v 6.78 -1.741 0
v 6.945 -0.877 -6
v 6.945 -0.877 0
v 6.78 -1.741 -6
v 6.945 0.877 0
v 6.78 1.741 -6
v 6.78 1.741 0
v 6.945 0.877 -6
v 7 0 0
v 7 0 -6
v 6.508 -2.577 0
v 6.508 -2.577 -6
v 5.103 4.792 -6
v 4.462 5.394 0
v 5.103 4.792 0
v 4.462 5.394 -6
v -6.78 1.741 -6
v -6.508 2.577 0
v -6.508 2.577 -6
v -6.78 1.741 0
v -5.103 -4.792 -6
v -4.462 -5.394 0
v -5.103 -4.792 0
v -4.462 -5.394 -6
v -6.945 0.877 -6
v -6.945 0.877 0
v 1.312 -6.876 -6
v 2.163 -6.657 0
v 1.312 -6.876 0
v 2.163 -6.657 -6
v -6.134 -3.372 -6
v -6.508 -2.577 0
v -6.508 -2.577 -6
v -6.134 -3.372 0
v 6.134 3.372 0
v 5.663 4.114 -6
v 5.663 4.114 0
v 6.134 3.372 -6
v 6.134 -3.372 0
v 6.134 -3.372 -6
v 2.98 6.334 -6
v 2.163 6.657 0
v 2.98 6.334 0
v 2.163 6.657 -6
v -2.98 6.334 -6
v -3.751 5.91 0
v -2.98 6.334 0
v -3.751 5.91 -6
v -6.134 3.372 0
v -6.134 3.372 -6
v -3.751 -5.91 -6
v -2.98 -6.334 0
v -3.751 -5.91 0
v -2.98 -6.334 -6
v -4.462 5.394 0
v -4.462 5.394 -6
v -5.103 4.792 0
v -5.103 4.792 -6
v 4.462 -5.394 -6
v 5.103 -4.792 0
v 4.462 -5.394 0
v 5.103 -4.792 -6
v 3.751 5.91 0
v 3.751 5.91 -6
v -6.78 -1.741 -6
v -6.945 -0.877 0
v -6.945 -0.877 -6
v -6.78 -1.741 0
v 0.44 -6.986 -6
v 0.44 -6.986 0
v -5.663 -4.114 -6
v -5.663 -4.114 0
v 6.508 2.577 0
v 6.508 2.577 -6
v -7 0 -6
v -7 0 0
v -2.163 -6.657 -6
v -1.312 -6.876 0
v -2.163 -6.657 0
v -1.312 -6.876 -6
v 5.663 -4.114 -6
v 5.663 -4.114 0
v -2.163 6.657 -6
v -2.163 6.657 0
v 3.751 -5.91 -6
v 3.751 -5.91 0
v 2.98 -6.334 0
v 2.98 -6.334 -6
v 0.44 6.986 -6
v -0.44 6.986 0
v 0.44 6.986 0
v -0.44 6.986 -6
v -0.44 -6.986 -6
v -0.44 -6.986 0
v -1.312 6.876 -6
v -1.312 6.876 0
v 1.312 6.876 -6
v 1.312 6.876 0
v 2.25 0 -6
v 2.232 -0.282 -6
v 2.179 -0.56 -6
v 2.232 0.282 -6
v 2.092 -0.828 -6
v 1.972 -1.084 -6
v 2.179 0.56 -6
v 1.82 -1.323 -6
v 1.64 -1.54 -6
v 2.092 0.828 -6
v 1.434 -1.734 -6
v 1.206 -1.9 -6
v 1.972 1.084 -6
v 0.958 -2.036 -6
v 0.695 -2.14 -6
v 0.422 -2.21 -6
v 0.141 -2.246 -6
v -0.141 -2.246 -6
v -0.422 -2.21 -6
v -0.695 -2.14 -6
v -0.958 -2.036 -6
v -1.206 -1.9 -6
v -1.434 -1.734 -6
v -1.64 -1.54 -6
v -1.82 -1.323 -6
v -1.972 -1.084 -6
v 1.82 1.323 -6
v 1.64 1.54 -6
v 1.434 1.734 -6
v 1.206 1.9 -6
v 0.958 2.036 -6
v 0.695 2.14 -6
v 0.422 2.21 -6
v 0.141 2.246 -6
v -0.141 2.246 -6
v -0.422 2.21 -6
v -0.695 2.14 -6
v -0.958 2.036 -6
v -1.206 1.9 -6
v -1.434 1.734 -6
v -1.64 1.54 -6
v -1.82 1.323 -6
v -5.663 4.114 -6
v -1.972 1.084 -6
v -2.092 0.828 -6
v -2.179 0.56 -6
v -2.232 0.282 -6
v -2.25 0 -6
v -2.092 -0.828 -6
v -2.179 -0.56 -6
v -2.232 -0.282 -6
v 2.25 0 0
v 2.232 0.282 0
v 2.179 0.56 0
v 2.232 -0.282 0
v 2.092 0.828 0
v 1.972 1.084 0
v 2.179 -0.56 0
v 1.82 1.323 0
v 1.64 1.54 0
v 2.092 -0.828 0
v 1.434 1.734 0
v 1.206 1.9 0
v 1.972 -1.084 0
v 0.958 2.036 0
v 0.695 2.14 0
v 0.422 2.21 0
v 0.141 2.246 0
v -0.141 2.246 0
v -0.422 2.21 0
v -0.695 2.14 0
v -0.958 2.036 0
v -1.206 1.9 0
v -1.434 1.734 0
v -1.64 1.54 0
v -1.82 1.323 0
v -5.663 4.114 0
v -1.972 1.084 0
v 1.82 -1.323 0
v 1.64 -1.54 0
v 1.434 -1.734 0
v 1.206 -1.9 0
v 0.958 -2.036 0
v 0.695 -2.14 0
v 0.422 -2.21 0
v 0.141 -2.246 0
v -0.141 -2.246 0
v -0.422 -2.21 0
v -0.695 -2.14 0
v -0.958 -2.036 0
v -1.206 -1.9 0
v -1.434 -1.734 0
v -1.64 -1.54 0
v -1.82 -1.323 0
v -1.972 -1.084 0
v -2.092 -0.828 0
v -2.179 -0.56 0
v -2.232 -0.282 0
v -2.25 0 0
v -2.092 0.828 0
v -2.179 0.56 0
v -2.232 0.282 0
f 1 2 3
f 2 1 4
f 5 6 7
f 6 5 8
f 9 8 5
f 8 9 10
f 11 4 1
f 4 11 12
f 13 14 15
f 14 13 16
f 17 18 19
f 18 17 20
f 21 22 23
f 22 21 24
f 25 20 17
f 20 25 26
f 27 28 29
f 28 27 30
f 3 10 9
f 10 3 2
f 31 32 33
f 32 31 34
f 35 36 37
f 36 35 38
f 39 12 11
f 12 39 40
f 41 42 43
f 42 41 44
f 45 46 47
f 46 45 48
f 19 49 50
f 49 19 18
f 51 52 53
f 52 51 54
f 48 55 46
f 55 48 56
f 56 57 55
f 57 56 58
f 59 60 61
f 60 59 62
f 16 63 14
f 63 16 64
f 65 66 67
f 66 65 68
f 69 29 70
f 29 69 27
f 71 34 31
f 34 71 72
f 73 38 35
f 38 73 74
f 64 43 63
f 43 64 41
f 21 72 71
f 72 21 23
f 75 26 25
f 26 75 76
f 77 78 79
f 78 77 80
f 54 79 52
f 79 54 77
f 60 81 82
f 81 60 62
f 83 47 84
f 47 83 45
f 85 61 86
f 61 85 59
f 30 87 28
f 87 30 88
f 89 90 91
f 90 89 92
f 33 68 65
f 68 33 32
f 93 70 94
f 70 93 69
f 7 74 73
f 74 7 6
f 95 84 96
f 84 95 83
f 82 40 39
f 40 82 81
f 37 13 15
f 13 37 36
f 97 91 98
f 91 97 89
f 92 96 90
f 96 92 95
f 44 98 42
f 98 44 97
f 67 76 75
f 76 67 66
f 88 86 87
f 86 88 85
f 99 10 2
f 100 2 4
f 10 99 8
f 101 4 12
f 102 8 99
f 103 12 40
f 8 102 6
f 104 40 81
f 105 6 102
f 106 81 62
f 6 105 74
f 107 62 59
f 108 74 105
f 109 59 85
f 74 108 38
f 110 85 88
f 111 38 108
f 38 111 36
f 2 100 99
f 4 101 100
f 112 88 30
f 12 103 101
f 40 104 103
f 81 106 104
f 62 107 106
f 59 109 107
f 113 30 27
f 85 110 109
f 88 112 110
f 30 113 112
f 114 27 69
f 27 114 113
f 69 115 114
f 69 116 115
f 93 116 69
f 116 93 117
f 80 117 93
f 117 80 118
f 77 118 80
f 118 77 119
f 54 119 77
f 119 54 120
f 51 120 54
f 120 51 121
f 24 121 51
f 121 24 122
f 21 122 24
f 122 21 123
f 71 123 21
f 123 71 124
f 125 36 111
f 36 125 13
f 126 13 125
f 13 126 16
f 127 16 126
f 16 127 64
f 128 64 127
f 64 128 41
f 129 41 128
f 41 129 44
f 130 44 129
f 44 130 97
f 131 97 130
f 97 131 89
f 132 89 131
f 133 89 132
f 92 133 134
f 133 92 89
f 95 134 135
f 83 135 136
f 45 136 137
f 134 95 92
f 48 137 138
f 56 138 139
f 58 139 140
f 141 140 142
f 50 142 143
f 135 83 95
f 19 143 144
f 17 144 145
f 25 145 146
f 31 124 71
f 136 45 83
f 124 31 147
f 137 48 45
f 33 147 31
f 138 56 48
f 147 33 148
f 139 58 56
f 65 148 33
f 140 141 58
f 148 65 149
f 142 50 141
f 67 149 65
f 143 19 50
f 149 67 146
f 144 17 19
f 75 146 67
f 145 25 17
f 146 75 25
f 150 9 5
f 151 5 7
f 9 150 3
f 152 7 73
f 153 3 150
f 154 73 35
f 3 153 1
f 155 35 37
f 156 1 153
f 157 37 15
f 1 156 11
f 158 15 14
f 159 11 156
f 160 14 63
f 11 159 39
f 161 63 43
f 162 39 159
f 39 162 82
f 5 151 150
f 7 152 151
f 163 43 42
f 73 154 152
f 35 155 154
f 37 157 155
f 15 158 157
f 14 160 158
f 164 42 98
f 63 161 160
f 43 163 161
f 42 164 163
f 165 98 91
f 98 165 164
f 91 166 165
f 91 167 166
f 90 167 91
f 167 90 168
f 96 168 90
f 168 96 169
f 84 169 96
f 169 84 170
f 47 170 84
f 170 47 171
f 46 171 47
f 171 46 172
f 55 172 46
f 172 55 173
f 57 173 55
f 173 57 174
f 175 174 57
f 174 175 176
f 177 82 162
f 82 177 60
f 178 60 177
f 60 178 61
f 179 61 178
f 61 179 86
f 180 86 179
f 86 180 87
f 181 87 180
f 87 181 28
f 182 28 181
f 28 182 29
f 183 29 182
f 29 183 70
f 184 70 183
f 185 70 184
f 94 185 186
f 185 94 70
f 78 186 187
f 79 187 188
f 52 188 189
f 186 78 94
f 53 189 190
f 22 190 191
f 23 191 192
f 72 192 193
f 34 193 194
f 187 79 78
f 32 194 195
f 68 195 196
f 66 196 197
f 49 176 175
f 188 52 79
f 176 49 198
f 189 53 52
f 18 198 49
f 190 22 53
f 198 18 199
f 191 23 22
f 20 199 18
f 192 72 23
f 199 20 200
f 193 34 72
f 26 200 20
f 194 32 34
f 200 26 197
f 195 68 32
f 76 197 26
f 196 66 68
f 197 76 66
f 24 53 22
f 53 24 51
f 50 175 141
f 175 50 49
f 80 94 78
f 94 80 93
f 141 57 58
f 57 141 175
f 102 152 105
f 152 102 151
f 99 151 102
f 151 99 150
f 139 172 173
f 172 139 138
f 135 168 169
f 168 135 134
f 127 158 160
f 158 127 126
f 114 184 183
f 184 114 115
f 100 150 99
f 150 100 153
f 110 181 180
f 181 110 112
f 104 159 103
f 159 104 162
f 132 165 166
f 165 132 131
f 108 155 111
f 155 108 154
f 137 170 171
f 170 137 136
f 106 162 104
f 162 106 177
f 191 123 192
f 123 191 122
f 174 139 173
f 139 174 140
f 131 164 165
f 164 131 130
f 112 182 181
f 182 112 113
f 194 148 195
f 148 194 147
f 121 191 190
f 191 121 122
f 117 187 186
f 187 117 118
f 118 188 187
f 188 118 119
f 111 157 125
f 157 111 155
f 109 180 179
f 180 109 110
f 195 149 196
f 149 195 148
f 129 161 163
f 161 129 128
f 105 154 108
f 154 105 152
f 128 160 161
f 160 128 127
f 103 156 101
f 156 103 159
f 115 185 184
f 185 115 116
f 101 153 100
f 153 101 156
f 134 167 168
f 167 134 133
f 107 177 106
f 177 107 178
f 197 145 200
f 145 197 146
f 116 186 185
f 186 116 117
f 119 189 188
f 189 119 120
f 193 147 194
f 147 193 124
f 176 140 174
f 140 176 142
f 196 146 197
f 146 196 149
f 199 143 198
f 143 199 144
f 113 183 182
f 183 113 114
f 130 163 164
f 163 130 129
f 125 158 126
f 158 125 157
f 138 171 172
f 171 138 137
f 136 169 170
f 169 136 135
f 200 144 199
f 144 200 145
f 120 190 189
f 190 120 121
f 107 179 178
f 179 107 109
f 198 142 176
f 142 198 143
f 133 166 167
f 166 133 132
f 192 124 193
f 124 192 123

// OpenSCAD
$fn = 50;


difference() {
	union() {
		translate(v = [0, 0, -6.0000000000]) {
			cylinder(h = 6, r = 7.0000000000);
		}
		cylinder(h = 0, r = 13.0000000000);
	}
	union() {
		#translate(v = [0, 0, -6]) {
			cylinder(h = 6, r = 2.2500000000);
		}
	}
}
